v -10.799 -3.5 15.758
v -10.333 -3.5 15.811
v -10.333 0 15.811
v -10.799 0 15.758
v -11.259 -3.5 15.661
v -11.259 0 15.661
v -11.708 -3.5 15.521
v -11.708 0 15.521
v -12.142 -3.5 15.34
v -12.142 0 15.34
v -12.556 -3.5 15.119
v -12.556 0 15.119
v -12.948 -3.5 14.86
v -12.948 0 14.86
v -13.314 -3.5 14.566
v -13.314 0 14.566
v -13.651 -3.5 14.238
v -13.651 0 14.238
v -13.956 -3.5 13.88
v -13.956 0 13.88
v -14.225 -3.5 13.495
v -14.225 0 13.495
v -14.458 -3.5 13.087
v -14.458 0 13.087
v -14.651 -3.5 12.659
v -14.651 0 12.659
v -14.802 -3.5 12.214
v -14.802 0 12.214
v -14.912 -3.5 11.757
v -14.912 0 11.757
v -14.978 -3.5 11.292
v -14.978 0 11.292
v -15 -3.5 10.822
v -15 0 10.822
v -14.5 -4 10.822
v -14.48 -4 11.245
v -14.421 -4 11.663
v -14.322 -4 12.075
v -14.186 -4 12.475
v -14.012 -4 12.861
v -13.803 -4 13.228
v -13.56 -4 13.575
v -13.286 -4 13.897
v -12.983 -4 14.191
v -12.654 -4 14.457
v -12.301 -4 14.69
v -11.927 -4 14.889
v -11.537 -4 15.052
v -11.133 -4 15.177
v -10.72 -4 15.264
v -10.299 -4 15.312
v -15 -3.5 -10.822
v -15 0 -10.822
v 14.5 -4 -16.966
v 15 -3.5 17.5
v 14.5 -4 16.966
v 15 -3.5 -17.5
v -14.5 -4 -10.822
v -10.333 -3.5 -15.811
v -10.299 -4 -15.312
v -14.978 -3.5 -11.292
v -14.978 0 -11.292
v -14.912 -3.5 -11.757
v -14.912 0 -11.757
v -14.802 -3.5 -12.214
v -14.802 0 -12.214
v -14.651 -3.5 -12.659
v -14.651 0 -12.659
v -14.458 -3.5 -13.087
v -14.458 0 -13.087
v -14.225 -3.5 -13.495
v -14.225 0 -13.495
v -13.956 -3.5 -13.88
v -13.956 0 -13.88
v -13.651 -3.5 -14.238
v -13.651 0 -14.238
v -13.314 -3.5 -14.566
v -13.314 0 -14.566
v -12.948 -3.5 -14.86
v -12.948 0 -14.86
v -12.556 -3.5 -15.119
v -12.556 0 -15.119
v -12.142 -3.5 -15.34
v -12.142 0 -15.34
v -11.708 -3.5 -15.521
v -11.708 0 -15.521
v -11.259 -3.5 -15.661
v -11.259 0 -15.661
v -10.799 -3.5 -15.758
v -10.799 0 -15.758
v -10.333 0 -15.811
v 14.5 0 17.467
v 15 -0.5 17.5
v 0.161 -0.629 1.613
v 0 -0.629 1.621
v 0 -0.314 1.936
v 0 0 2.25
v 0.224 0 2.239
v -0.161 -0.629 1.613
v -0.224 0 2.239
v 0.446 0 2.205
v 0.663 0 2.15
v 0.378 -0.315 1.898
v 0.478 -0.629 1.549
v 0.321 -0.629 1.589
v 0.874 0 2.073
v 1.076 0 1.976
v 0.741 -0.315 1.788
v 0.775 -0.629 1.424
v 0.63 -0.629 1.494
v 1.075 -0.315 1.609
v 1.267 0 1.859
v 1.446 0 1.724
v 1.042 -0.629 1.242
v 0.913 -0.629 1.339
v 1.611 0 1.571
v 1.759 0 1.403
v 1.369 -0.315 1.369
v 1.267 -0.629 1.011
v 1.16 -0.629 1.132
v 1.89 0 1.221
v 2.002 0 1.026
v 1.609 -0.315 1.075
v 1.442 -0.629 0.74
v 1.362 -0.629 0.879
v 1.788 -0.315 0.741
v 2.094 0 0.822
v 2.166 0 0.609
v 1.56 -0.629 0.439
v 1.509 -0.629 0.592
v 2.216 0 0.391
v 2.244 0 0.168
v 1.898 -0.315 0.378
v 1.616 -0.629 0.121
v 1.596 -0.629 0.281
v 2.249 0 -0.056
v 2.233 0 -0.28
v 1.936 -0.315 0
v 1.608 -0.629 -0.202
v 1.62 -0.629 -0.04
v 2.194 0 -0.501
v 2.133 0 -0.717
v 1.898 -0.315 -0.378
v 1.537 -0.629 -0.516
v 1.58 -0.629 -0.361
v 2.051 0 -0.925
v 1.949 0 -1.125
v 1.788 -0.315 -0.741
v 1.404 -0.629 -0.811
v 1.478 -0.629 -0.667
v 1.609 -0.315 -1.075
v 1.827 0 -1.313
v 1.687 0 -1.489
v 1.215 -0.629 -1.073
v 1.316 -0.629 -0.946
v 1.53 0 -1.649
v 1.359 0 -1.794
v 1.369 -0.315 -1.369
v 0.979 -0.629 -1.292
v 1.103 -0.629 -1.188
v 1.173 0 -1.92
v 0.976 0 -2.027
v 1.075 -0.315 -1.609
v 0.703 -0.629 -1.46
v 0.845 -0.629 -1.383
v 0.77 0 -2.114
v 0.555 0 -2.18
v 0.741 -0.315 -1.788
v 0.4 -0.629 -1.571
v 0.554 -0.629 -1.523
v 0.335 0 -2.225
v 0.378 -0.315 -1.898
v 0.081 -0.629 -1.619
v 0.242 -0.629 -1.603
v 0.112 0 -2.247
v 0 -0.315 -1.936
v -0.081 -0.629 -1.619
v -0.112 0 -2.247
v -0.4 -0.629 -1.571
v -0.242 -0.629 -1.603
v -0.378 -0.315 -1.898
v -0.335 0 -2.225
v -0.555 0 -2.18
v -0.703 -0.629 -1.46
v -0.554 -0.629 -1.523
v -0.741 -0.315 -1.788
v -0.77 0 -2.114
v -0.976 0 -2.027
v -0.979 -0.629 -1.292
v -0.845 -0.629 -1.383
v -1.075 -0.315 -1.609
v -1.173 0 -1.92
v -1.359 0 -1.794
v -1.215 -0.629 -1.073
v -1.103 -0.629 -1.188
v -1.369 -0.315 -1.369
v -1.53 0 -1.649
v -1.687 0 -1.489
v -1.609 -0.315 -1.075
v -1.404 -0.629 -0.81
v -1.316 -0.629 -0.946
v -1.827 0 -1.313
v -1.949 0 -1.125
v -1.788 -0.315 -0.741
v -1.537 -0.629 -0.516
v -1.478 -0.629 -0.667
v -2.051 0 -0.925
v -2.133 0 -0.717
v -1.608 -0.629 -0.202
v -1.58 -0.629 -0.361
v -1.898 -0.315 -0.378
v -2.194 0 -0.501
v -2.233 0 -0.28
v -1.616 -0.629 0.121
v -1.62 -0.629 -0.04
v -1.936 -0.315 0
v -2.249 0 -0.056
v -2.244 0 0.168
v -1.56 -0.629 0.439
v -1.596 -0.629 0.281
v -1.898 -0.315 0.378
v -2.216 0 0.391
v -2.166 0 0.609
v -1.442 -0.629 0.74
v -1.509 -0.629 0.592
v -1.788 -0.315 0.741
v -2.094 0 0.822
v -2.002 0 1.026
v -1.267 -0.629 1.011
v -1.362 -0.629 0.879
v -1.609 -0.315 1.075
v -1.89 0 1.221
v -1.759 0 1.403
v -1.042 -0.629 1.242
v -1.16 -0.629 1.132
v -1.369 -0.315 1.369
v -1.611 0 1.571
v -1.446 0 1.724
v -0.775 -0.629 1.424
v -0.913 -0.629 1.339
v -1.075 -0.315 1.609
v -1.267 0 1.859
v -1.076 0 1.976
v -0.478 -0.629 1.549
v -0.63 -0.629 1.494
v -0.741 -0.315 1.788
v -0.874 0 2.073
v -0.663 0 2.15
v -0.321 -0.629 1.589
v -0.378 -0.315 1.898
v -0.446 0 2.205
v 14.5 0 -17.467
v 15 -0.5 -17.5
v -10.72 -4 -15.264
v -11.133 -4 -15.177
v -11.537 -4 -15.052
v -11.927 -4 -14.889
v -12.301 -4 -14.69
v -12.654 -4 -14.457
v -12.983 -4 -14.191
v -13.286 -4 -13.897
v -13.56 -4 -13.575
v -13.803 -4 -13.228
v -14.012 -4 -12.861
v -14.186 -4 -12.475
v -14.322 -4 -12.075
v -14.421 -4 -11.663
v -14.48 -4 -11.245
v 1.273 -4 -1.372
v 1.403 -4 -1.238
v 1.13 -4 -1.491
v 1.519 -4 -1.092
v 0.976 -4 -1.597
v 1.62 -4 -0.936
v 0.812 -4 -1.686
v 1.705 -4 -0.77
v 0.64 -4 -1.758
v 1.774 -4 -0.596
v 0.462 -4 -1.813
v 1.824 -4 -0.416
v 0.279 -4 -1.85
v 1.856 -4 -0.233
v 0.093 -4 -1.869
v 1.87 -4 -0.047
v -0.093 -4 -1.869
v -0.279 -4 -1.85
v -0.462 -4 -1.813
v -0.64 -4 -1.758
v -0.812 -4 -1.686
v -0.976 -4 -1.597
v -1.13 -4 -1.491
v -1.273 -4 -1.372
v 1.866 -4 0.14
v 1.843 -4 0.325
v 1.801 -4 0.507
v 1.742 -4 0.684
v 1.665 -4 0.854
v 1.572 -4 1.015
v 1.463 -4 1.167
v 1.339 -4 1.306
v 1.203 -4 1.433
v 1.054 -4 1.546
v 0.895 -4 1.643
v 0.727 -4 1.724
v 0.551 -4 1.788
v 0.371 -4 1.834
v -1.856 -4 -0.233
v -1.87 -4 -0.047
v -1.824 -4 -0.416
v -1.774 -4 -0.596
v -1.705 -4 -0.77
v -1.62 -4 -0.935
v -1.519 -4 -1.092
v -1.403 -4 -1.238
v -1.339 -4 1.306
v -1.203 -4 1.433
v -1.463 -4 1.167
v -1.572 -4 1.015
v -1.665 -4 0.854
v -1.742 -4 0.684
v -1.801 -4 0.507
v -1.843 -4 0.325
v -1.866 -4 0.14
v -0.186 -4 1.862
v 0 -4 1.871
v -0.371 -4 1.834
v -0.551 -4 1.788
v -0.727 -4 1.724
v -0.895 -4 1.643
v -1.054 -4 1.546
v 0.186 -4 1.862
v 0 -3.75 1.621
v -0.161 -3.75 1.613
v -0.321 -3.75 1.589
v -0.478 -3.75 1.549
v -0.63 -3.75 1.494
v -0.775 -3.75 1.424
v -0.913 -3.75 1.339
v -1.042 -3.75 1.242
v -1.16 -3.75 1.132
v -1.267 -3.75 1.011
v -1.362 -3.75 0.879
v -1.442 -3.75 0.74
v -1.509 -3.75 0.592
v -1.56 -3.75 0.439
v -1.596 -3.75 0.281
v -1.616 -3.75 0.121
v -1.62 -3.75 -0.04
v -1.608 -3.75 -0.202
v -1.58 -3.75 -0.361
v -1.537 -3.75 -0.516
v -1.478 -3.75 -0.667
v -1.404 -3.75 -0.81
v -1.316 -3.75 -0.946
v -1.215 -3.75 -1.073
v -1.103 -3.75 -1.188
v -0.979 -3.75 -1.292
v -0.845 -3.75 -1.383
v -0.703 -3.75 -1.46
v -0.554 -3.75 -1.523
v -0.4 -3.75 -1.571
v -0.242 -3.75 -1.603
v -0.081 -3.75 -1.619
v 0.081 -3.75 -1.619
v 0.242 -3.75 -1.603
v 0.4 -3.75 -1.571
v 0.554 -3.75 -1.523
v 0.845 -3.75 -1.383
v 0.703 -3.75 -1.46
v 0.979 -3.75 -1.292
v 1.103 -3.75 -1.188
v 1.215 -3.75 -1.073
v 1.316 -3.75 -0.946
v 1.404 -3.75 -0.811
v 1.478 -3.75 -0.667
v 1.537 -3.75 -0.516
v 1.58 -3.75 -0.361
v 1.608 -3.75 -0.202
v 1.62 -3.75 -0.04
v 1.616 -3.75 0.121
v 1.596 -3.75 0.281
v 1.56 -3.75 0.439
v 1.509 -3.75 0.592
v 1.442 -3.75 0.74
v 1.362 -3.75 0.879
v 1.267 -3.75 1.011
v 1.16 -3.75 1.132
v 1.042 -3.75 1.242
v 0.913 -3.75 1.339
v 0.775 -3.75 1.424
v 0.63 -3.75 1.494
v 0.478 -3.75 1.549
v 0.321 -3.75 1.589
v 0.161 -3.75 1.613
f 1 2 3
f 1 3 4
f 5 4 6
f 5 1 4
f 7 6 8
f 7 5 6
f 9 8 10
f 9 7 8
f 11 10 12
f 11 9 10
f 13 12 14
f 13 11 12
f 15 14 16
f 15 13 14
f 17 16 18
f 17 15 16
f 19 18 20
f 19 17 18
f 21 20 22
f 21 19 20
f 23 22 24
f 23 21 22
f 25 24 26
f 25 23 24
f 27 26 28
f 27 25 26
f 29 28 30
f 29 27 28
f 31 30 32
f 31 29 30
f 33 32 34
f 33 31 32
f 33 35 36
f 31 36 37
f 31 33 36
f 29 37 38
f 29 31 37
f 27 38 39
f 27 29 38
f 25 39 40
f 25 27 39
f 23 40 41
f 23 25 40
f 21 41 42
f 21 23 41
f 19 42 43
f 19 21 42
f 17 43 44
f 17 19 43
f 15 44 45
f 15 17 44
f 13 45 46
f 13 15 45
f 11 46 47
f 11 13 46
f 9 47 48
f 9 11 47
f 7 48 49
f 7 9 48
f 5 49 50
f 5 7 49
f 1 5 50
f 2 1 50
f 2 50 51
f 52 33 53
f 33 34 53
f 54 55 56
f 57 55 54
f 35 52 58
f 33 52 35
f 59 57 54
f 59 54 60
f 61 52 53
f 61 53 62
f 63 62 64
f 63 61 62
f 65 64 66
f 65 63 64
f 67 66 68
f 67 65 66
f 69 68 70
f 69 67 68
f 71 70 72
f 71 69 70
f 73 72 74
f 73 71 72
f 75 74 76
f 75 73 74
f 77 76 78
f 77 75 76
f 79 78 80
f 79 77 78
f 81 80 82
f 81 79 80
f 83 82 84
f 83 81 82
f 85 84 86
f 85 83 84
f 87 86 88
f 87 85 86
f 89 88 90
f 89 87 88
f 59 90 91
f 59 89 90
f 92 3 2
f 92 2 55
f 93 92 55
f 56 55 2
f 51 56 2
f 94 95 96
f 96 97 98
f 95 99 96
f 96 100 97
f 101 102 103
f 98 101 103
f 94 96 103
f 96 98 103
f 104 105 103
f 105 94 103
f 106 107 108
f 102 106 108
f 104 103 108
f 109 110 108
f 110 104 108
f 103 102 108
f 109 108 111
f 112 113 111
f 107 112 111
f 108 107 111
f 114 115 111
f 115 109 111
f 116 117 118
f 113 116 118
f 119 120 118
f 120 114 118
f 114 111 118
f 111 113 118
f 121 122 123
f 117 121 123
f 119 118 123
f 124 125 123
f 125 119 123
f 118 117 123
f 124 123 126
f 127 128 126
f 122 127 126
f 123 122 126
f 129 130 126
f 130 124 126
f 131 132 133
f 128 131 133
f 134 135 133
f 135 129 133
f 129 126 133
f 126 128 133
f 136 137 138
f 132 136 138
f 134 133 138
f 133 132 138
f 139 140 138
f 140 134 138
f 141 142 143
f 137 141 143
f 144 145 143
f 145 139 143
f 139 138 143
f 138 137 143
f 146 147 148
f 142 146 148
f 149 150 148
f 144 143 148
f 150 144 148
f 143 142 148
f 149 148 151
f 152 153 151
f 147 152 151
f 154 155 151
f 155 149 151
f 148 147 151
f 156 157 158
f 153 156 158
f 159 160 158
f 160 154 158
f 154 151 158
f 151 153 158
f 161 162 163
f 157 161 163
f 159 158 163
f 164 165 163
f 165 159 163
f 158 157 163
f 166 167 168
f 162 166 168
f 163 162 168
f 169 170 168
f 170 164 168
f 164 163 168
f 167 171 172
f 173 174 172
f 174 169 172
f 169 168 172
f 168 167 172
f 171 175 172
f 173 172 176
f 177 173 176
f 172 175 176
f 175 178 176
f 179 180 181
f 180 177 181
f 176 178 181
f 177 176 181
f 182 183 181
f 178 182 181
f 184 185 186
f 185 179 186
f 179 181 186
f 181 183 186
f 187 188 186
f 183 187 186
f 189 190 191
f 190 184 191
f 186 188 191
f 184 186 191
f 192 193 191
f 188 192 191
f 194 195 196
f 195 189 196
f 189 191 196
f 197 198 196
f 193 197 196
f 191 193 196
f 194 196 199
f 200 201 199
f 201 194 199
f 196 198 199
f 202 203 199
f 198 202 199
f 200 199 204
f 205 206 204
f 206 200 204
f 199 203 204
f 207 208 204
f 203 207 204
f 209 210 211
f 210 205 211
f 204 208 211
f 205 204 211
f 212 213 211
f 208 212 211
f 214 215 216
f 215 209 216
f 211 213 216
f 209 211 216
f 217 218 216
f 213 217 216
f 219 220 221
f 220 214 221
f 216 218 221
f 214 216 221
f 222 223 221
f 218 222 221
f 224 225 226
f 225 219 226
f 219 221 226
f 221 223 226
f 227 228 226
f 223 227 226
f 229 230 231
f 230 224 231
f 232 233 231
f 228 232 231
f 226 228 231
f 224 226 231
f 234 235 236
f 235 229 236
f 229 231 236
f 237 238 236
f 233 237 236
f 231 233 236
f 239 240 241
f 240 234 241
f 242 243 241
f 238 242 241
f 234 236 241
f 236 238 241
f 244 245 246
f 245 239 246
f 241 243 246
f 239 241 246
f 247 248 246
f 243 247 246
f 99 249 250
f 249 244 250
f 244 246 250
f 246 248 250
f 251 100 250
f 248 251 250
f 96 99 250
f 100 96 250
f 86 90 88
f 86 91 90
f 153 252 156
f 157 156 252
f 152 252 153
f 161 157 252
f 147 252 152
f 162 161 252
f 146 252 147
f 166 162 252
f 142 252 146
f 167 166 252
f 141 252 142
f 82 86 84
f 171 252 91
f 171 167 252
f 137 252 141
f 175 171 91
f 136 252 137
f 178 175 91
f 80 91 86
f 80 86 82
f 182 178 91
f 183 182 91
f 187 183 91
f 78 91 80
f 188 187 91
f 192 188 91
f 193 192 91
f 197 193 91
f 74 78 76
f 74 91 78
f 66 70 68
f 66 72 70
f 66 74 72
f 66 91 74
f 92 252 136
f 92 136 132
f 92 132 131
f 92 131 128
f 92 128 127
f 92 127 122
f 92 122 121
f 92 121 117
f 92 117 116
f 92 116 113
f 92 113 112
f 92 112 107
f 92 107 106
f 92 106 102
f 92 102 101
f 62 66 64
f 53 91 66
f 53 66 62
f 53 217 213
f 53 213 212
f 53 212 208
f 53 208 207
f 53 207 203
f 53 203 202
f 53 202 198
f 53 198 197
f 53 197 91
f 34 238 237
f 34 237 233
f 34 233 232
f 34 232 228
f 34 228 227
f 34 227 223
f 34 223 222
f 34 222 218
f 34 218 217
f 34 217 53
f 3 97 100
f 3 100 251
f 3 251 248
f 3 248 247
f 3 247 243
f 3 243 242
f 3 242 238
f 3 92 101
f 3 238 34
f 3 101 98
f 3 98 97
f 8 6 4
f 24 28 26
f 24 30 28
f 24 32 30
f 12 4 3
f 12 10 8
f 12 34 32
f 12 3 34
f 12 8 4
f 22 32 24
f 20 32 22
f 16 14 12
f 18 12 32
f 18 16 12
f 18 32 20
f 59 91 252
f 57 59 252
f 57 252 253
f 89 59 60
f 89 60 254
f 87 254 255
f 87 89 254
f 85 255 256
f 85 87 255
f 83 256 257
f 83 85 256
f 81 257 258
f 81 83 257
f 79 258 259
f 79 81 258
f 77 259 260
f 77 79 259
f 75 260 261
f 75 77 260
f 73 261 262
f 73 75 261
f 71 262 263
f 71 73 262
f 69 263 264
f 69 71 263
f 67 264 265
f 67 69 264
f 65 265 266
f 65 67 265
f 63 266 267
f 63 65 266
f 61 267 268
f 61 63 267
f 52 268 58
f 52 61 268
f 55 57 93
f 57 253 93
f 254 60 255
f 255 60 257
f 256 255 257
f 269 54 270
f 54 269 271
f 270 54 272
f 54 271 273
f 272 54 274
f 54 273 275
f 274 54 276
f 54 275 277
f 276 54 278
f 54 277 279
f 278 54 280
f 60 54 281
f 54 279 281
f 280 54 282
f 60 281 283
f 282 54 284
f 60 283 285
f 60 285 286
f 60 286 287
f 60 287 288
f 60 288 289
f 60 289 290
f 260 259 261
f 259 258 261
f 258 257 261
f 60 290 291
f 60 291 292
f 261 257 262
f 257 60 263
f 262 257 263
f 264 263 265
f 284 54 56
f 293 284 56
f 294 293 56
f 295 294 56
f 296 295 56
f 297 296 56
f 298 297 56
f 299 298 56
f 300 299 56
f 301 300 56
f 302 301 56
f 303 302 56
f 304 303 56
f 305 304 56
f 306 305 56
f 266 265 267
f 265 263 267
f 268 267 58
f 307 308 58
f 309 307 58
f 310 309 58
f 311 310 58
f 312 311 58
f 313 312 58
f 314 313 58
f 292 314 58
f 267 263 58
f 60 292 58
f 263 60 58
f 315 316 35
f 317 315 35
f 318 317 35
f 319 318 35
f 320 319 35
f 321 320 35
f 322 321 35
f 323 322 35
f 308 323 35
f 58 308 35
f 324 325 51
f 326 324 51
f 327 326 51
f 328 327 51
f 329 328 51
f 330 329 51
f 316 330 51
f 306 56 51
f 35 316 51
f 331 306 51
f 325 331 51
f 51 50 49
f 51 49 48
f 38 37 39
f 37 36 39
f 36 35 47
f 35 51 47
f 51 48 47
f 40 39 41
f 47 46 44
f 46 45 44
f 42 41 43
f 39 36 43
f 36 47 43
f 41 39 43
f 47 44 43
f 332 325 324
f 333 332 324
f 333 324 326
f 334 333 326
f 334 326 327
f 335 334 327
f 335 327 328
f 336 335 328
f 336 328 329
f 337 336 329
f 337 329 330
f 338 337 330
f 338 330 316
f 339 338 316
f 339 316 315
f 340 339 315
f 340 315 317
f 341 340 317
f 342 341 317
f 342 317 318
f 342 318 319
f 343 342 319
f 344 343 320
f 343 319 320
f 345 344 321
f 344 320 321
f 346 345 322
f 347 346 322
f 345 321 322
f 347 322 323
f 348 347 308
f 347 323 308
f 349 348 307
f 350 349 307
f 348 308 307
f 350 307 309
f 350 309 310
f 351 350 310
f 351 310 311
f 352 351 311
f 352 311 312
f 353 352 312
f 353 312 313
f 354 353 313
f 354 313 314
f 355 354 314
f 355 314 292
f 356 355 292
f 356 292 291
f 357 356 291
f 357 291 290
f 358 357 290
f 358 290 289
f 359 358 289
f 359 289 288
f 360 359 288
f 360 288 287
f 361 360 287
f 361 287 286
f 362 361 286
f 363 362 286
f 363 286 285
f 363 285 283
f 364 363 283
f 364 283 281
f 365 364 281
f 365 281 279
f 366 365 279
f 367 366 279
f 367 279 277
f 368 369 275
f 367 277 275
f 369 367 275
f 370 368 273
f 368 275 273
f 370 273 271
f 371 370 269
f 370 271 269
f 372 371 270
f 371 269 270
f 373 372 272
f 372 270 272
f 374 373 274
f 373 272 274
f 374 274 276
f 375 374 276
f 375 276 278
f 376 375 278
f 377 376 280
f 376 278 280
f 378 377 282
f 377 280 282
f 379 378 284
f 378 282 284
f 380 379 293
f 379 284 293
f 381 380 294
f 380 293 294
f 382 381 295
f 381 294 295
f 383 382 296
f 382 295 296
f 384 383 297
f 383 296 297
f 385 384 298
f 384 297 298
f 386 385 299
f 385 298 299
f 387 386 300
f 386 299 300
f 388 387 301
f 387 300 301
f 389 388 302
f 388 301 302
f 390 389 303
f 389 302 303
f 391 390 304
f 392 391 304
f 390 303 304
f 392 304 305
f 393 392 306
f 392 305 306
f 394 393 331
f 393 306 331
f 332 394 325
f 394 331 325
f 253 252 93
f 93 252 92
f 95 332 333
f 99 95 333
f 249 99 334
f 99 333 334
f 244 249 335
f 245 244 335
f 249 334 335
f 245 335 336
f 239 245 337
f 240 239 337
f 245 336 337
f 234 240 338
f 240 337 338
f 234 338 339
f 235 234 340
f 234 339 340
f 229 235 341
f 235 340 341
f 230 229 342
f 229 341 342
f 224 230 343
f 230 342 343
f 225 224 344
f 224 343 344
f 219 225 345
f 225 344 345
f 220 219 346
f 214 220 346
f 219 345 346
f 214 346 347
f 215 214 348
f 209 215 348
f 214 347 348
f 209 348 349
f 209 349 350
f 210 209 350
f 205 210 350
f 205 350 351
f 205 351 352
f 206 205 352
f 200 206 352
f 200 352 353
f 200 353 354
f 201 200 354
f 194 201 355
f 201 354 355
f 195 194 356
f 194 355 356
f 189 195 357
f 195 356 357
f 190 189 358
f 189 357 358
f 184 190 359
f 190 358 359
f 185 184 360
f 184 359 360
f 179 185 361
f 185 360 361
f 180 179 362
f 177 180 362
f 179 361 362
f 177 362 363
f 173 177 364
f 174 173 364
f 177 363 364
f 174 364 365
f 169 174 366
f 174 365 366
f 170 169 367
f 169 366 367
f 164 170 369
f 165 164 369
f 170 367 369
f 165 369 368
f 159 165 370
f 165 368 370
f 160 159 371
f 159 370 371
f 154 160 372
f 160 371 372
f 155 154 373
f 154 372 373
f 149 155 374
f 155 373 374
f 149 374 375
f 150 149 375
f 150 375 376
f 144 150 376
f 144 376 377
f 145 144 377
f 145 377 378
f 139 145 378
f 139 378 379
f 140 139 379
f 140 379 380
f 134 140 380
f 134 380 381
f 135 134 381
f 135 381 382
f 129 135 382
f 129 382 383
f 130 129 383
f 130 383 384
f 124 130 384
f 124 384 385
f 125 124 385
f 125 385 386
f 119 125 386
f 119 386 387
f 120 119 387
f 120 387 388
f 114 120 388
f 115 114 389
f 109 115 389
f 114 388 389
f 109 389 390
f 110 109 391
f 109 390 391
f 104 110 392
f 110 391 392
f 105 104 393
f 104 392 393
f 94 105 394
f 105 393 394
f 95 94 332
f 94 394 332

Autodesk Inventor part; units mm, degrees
ref_plane "YZ Plane" through (0, 0, 0) normal (1, 0, 0) x (0, 1, 0)
ref_plane "XZ Plane" through (0, 0, 0) normal (0, 1, 0) x (-1, 0, 0)
ref_plane "XY Plane" through (0, 0, 0) normal (0, 0, 1) x (1, 0, 0)
sketch "Sketch1" plane through (0, 0, 0) normal (0, 1, 0) x (-1, 0, 0)
  line L0 (-15, 17.5) -> (15, 17.5)
  line L1 (15, 17.5) -> (15, -17.5)
  line L2 (15, -17.5) -> (-15, -17.5)
  line L3 (-15, -17.5) -> (-15, 17.5)
  line L4 (-15, 17.5) -> (15, -17.5) construction
  line L5 (15, 17.5) -> (-15, -17.5) construction
  line L6 (15, -15.5) -> (-15, -17.5)
  line L7 (21, 0) -> (-21, 0) construction
  line L8 (15, 15.5) -> (-15, 17.5)
  point P0 (0, 0)
  point P1 (0, 0)
  dimension "d1" = 30
  dimension "d2" = 35
  dimension "d19" = 31
  dimension "d20" = 30
extrude "Extrusion1" add sketch "Sketch1" against normal blind 4 contours L8 L1 L6 L3
hole "Hole1" at (0, 0, 0) direction (0, -1, 0) diameter 3.242 end through all countersink diameter 4.5 countersink angle 90 thread size "M4x0.7" class "6H" standard "ISO Metric profile"
chamfer "Chamfer1" distance 0.25 angle 45 1 edges at (0, -4, -1.621)
fillet "Fillet1" radius 5 2 edges at (-15, -2, 15.5) (-15, -2, -15.5)
chamfer "Chamfer2" distance 0.5 angle 45 5 edges at (15, 0, 0) (-13.6512, -4, 14.2382) (-13.6512, -4, -14.2382) (-15, -4, 0) (15, -4, 0)
properties part number "TCSM1-002A" material "Brass, Soft Yellow"
